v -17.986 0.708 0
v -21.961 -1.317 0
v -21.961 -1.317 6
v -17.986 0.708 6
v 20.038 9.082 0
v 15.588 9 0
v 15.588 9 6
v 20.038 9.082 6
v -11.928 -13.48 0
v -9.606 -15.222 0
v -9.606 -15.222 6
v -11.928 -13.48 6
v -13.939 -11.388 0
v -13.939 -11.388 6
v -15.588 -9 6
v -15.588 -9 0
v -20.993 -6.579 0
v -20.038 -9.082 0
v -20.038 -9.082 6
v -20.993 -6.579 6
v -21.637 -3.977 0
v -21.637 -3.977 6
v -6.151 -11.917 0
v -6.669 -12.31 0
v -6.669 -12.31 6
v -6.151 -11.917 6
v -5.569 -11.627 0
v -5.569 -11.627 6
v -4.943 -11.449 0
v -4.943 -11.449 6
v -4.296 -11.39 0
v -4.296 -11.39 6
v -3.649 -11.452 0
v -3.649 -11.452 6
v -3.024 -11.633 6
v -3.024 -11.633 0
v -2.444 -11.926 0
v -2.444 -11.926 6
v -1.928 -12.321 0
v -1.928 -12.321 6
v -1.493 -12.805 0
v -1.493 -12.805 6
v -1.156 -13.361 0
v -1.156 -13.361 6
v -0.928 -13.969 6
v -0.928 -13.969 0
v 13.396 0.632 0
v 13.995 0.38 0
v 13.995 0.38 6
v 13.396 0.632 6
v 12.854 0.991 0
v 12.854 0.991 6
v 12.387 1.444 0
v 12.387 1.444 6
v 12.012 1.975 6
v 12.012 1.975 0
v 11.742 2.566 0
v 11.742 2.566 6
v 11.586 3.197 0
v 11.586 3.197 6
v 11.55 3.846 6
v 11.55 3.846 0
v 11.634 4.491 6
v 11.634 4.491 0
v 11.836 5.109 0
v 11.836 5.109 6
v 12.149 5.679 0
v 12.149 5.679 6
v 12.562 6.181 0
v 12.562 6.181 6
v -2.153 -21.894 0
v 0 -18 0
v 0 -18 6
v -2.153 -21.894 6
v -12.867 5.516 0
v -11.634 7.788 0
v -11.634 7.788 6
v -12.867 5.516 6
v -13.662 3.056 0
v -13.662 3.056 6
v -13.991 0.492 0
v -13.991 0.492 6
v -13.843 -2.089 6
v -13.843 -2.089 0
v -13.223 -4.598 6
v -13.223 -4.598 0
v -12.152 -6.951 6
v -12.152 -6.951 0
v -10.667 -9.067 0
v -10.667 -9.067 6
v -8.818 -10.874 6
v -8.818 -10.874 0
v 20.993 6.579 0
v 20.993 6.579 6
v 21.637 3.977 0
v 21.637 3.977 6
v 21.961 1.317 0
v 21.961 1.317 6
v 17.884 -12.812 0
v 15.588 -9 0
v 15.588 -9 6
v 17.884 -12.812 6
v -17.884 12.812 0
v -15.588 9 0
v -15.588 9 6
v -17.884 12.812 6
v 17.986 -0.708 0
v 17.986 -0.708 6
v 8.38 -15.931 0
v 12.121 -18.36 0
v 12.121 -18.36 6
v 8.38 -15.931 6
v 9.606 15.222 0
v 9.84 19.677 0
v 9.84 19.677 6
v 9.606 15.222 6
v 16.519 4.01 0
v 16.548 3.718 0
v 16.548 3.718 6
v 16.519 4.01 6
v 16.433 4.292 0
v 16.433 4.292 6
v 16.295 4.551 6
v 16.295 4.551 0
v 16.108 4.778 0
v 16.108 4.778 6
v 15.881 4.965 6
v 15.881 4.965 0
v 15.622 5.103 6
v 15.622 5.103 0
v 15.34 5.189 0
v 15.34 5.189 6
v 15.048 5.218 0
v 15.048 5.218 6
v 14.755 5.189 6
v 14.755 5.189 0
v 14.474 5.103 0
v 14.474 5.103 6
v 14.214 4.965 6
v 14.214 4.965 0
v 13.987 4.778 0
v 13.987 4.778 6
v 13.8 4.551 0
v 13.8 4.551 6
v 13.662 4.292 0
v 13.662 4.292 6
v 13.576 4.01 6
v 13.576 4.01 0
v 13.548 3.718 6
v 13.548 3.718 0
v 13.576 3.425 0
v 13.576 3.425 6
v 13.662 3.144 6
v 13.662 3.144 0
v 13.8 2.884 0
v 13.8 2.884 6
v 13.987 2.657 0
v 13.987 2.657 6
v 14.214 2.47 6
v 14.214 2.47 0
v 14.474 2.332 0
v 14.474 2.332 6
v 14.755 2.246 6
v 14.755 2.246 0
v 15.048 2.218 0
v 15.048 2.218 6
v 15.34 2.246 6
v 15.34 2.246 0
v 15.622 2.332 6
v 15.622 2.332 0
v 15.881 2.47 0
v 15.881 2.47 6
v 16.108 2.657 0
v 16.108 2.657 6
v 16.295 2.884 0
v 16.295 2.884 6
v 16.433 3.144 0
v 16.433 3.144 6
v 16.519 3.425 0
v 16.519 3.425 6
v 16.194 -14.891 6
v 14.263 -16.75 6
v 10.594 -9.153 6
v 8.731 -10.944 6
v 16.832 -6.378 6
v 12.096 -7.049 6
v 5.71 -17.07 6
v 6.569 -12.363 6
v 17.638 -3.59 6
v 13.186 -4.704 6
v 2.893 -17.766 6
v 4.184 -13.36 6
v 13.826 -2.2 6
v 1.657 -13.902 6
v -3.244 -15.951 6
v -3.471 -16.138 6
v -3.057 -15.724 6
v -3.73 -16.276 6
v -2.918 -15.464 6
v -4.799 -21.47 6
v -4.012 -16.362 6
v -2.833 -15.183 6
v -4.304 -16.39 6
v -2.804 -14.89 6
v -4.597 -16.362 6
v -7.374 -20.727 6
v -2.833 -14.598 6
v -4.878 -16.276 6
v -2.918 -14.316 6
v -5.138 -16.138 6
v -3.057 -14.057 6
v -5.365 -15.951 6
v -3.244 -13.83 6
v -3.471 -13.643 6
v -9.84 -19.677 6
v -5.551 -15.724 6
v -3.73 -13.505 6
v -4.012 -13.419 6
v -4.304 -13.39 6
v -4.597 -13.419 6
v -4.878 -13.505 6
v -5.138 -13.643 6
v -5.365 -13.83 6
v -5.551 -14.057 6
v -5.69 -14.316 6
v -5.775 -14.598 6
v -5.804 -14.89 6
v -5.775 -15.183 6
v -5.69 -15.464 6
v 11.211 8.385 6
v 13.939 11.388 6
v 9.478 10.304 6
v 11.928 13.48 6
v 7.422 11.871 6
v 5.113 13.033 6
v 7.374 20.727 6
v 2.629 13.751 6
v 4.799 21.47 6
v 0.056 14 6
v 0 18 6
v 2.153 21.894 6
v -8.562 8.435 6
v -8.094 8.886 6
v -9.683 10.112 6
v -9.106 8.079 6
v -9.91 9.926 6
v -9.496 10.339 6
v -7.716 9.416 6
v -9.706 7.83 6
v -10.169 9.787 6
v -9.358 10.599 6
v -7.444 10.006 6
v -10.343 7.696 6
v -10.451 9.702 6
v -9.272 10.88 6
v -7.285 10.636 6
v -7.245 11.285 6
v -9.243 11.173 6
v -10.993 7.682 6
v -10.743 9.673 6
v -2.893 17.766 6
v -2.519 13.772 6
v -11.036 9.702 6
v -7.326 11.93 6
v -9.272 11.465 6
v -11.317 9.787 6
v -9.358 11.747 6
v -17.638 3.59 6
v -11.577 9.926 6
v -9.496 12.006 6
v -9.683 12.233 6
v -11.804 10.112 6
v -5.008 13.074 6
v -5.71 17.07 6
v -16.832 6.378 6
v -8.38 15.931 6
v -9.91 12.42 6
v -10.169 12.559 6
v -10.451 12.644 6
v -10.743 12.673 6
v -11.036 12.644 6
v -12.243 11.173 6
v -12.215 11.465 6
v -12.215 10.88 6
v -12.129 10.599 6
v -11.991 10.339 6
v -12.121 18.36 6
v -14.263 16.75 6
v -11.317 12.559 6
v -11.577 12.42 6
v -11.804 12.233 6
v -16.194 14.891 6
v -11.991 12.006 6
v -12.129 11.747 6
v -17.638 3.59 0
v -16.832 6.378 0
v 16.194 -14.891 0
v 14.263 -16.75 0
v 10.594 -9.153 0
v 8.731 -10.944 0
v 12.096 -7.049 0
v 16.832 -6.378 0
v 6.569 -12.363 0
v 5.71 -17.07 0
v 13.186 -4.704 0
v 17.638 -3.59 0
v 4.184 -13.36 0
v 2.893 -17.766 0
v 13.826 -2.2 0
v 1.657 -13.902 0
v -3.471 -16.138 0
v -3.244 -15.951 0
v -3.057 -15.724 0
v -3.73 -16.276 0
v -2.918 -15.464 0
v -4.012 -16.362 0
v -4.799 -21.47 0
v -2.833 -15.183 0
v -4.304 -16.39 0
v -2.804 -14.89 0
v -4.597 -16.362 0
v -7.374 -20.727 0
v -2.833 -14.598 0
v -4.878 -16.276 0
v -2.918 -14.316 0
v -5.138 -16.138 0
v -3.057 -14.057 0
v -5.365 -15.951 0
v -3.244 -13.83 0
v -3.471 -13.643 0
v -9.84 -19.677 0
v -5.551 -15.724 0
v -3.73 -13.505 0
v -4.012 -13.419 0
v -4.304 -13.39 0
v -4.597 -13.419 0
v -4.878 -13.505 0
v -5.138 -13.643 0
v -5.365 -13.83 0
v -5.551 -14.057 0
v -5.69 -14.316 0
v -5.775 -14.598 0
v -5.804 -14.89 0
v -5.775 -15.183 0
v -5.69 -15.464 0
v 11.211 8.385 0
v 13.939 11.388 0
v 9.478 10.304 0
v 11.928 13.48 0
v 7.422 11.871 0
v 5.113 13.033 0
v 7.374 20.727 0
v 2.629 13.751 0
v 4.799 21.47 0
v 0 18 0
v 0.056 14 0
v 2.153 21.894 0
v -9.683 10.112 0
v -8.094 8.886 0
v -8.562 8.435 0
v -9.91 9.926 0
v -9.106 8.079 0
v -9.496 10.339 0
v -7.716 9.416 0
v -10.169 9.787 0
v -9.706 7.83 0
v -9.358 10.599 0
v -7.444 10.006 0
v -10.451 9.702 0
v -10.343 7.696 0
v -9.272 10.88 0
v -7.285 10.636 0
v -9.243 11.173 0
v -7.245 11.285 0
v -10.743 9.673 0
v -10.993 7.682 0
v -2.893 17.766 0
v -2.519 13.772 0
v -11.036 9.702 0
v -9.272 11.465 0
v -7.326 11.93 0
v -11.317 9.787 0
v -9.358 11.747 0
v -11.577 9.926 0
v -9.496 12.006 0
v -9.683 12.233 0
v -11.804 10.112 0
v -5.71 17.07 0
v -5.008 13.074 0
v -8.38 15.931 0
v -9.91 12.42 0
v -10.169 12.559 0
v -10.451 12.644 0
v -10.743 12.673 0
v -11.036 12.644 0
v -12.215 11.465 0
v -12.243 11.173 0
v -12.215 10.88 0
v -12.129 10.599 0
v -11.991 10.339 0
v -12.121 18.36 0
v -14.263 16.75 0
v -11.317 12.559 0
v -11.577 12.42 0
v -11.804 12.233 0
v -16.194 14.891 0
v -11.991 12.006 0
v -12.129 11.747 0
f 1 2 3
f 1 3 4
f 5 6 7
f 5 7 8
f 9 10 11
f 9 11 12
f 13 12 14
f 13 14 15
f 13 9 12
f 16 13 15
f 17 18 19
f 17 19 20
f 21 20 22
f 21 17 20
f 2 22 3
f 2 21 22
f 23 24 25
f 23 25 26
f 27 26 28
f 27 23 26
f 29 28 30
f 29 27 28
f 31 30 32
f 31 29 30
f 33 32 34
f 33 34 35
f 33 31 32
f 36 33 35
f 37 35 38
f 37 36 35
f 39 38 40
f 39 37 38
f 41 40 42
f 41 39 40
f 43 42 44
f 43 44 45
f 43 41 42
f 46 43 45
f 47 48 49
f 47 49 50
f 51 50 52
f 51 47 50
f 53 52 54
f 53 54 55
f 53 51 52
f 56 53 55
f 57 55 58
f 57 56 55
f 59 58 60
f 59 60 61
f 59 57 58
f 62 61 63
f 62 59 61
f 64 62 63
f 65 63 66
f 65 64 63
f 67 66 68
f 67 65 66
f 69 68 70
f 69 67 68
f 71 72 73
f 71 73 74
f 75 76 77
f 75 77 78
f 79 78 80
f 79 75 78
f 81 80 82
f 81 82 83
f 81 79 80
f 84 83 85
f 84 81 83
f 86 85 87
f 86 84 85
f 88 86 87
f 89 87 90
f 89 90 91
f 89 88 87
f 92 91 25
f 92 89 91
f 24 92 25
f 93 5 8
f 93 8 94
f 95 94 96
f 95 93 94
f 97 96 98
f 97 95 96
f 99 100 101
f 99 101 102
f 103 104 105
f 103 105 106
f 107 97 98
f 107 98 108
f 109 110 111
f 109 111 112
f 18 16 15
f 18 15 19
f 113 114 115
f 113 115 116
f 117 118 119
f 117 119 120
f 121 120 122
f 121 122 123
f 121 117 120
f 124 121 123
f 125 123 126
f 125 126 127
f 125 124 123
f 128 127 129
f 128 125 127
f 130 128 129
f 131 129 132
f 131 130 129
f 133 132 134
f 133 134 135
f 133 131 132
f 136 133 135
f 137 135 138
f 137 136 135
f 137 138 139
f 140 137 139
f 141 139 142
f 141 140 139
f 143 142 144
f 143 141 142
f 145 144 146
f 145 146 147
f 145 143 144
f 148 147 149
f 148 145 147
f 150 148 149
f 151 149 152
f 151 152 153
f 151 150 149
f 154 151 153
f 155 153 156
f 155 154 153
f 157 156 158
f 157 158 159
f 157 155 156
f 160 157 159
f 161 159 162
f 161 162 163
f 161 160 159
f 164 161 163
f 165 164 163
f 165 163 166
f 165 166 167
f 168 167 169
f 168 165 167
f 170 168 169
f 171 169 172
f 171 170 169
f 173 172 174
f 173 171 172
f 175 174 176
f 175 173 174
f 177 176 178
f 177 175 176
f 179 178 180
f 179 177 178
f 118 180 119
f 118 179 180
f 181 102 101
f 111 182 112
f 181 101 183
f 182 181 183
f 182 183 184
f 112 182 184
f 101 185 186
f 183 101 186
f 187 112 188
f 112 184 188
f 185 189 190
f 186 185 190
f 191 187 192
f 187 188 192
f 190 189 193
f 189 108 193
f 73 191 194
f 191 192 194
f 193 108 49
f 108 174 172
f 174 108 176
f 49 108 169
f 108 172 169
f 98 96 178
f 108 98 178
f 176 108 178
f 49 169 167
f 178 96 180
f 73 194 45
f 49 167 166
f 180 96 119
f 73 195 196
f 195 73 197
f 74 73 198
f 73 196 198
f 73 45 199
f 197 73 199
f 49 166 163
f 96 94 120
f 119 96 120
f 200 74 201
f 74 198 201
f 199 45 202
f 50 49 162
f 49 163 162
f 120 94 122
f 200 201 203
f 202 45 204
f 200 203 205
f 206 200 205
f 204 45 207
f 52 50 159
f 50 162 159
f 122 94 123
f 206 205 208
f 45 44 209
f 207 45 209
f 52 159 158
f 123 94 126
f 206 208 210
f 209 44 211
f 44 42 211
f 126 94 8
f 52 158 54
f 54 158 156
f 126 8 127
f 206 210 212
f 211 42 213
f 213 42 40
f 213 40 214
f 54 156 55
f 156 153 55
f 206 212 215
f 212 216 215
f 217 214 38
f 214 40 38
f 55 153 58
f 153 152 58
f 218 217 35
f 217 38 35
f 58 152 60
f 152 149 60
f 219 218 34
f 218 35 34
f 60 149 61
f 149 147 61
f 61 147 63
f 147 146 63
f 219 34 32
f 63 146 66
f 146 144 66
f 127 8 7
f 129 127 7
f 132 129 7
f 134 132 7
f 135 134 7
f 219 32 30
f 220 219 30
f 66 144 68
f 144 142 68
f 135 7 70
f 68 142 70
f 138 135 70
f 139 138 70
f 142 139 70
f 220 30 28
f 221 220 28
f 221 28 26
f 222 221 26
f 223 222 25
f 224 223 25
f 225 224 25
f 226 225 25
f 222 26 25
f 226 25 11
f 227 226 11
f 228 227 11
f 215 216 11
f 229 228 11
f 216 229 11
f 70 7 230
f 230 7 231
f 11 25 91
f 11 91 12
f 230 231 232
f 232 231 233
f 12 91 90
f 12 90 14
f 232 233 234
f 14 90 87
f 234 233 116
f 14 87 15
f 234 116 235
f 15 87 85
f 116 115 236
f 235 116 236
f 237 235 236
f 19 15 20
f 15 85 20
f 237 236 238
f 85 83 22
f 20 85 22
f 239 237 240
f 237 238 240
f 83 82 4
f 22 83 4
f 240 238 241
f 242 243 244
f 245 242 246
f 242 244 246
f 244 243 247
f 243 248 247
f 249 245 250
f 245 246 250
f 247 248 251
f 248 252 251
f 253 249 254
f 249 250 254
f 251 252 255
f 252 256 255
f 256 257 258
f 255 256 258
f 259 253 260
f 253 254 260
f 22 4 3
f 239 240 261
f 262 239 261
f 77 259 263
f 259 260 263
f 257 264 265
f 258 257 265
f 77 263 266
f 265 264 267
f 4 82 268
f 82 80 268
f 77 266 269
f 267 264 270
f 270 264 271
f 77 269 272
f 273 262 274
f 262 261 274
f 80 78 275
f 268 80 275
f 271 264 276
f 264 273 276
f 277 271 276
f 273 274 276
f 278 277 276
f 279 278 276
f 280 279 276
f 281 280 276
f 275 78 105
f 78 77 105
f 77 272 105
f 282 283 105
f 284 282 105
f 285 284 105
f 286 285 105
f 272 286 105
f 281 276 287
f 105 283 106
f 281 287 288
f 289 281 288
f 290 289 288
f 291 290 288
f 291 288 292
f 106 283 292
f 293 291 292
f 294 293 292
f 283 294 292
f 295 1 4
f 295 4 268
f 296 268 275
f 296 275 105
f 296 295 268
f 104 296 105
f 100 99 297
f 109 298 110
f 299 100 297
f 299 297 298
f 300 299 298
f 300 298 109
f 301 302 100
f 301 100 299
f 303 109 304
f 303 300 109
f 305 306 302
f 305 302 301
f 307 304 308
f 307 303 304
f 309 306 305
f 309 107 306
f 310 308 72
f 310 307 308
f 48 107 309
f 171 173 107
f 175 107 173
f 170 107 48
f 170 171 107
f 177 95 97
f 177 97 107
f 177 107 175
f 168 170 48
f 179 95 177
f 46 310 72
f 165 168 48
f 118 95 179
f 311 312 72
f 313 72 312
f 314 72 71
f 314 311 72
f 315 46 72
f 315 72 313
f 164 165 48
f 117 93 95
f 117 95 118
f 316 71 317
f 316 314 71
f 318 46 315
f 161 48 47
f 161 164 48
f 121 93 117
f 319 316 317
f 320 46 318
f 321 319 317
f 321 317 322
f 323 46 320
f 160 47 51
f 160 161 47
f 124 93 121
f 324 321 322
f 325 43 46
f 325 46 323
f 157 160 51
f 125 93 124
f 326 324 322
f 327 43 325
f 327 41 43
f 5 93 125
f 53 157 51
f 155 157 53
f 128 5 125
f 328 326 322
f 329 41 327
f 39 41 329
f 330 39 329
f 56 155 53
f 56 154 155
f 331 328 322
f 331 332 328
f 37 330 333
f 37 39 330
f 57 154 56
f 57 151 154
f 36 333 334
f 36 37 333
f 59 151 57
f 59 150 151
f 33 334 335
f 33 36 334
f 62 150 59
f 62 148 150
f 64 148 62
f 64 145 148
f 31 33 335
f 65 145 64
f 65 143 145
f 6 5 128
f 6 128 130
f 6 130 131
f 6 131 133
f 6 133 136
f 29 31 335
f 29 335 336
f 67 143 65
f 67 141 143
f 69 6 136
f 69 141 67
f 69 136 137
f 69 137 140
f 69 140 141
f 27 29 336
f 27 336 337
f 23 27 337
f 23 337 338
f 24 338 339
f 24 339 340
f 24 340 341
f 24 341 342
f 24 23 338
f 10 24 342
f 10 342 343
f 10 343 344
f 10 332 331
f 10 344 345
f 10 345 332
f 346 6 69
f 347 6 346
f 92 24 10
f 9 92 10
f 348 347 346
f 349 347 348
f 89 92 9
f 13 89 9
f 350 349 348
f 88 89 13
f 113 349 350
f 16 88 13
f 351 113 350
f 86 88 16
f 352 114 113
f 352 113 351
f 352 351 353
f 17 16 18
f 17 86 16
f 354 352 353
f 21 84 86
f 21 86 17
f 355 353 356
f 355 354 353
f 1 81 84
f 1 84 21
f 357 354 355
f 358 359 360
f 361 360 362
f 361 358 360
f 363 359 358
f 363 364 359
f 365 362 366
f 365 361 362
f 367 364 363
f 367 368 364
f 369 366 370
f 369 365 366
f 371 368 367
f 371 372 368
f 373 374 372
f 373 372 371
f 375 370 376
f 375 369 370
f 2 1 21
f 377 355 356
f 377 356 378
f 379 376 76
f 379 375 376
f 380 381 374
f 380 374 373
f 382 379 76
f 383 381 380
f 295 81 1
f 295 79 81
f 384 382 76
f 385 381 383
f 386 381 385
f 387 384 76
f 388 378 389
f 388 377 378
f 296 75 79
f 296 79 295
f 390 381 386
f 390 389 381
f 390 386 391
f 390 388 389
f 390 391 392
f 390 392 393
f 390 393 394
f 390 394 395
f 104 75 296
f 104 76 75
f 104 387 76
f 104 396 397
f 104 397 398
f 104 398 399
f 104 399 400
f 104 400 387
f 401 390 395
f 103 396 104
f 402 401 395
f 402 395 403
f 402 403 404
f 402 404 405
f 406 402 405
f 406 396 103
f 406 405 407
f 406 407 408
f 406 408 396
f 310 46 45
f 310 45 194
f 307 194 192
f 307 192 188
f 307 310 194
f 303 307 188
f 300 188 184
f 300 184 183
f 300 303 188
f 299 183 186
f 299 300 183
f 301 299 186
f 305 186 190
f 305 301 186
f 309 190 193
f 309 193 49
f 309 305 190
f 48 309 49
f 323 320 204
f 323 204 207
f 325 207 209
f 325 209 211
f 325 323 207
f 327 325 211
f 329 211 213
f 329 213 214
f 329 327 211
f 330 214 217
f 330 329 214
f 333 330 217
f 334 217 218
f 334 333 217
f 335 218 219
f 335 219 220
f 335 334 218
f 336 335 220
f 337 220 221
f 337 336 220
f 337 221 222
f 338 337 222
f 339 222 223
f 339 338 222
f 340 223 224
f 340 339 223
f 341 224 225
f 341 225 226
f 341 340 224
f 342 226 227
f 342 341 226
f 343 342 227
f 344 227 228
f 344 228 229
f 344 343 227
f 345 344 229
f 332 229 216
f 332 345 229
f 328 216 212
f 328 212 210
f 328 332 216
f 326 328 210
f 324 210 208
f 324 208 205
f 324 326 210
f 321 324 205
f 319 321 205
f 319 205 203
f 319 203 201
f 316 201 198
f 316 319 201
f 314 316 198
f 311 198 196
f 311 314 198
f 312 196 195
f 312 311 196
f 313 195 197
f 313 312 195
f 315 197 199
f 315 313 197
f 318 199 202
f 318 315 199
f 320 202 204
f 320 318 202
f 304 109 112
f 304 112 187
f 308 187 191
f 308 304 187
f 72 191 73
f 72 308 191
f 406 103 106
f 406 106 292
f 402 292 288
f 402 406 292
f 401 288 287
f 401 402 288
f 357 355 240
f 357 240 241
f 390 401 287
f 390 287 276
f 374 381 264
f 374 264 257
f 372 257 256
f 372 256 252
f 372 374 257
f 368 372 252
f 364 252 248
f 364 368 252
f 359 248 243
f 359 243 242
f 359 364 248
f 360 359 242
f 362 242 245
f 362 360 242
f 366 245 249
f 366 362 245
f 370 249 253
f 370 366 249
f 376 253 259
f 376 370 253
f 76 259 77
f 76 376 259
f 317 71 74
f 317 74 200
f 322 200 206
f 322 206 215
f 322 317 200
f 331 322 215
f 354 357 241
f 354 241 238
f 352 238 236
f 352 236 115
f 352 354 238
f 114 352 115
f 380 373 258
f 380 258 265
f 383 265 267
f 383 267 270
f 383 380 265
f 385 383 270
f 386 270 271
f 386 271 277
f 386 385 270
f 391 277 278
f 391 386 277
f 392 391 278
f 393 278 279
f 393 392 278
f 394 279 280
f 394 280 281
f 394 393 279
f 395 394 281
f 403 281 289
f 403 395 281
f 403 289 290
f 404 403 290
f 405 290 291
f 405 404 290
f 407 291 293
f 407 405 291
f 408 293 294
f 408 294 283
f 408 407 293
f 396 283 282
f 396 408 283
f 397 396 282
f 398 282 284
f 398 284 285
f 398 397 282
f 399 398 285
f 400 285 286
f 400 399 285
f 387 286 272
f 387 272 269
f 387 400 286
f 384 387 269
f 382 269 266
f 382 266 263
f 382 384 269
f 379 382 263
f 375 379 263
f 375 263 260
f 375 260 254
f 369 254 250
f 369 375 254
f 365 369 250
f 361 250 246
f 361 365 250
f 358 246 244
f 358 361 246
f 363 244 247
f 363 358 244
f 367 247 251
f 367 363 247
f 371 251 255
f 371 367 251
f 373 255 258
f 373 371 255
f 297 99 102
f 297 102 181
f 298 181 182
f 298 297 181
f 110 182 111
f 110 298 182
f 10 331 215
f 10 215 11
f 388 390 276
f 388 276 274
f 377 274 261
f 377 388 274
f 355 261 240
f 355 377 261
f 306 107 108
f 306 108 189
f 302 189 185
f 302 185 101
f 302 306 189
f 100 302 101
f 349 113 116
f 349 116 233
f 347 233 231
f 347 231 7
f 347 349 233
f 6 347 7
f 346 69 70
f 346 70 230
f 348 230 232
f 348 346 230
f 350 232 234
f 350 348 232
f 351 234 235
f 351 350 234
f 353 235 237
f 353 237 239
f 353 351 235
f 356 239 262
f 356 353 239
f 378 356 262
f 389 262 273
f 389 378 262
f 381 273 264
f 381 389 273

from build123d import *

# Parameters (mm, degrees)
ESQUISSE1_R        = 1.5
BOSS_EXTRU_1_DEPTH = 6


with BuildPart() as part:
    # Esquisse1 → Boss.-Extru.1 (new body)
    with BuildSketch(Plane.XY):
        with BuildLine():
            Line((0, 18), (2.153216979, 21.894375))
            ThreePointArc((2.153216979, 21.894375), (6.098122971, 21.137949197), (9.83974396, 19.676875738))
            Line((9.83974396, 19.676875738), (9.606453592, 15.222222222))
            ThreePointArc((9.606453592, 15.222222222), (12.975935252, 12.474979132), (15.588457268, 9))
            Line((15.588457268, 9), (20.03769344, 9.082446896))
            ThreePointArc((20.03769344, 9.082446896), (21.355062473, 5.28784519), (21.960546236, 1.316969633))
            Line((21.960546236, 1.316969633), (17.986057943, -0.70832174))
            ThreePointArc((17.986057943, -0.70832174), (17.291616466, -5), (15.588457268, -9))
            Line((15.588457268, -9), (17.88447646, -12.811928104))
            ThreePointArc((17.88447646, -12.811928104), (15.256939503, -15.850104006), (12.120802276, -18.359906105))
            Line((12.120802276, -18.359906105), (8.37960435, -15.930543962))
            ThreePointArc((8.37960435, -15.930543962), (4.315681214, -17.474979132), (0, -18))
            Line((0, -18), (-2.153216979, -21.894375))
            ThreePointArc((-2.153216979, -21.894375), (-6.098122971, -21.137949197), (-9.83974396, -19.676875738))
            Line((-9.83974396, -19.676875738), (-9.606453592, -15.222222222))
            ThreePointArc((-9.606453592, -15.222222222), (-12.975935252, -12.474979132), (-15.588457268, -9))
            Line((-15.588457268, -9), (-20.03769344, -9.082446896))
            ThreePointArc((-20.03769344, -9.082446896), (-21.355062473, -5.28784519), (-21.960546236, -1.316969633))
            Line((-21.960546236, -1.316969633), (-17.986057943, 0.70832174))
            ThreePointArc((-17.986057943, 0.70832174), (-17.291616466, 5), (-15.588457268, 9))
            Line((-15.588457268, 9), (-17.88447646, 12.811928104))
            ThreePointArc((-17.88447646, 12.811928104), (-15.256939503, 15.850104006), (-12.120802276, 18.359906105))
            Line((-12.120802276, 18.359906105), (-8.37960435, 15.930543962))
            ThreePointArc((-8.37960435, 15.930543962), (-4.315681214, 17.474979132), (0, 18))
        make_face()
        with Locations((-10.743337321, 11.17276614)):
            Circle(ESQUISSE1_R, mode=Mode.SUBTRACT)
        with Locations((15.047567968, 3.717619972)):
            Circle(ESQUISSE1_R, mode=Mode.SUBTRACT)
        with Locations((-4.304230647, -14.890386111)):
            Circle(ESQUISSE1_R, mode=Mode.SUBTRACT)
        with BuildLine():
            ThreePointArc((-11.633900603, 7.787962299), (-13.591351713, -3.357850297), (-6.668605179, -12.309740248))
            ThreePointArc((-6.668605179, -12.309740248), (-3.332307598, -11.52804086), (-0.927622893, -13.969234616))
            ThreePointArc((-0.927622893, -13.969234616), (9.703659516, -10.091530707), (13.994850358, 0.379688631))
            ThreePointArc((13.994850358, 0.379688631), (11.64973004, 2.878157397), (12.561523496, 6.181272318))
            ThreePointArc((12.561523496, 6.181272318), (3.887692197, 13.449381004), (-7.326245179, 11.930051617))
            ThreePointArc((-7.326245179, 11.930051617), (-8.317422442, 8.649883463), (-11.633900603, 7.787962299))
        make_face(mode=Mode.SUBTRACT)
    extrude(amount=BOSS_EXTRU_1_DEPTH)


solid = part.part
